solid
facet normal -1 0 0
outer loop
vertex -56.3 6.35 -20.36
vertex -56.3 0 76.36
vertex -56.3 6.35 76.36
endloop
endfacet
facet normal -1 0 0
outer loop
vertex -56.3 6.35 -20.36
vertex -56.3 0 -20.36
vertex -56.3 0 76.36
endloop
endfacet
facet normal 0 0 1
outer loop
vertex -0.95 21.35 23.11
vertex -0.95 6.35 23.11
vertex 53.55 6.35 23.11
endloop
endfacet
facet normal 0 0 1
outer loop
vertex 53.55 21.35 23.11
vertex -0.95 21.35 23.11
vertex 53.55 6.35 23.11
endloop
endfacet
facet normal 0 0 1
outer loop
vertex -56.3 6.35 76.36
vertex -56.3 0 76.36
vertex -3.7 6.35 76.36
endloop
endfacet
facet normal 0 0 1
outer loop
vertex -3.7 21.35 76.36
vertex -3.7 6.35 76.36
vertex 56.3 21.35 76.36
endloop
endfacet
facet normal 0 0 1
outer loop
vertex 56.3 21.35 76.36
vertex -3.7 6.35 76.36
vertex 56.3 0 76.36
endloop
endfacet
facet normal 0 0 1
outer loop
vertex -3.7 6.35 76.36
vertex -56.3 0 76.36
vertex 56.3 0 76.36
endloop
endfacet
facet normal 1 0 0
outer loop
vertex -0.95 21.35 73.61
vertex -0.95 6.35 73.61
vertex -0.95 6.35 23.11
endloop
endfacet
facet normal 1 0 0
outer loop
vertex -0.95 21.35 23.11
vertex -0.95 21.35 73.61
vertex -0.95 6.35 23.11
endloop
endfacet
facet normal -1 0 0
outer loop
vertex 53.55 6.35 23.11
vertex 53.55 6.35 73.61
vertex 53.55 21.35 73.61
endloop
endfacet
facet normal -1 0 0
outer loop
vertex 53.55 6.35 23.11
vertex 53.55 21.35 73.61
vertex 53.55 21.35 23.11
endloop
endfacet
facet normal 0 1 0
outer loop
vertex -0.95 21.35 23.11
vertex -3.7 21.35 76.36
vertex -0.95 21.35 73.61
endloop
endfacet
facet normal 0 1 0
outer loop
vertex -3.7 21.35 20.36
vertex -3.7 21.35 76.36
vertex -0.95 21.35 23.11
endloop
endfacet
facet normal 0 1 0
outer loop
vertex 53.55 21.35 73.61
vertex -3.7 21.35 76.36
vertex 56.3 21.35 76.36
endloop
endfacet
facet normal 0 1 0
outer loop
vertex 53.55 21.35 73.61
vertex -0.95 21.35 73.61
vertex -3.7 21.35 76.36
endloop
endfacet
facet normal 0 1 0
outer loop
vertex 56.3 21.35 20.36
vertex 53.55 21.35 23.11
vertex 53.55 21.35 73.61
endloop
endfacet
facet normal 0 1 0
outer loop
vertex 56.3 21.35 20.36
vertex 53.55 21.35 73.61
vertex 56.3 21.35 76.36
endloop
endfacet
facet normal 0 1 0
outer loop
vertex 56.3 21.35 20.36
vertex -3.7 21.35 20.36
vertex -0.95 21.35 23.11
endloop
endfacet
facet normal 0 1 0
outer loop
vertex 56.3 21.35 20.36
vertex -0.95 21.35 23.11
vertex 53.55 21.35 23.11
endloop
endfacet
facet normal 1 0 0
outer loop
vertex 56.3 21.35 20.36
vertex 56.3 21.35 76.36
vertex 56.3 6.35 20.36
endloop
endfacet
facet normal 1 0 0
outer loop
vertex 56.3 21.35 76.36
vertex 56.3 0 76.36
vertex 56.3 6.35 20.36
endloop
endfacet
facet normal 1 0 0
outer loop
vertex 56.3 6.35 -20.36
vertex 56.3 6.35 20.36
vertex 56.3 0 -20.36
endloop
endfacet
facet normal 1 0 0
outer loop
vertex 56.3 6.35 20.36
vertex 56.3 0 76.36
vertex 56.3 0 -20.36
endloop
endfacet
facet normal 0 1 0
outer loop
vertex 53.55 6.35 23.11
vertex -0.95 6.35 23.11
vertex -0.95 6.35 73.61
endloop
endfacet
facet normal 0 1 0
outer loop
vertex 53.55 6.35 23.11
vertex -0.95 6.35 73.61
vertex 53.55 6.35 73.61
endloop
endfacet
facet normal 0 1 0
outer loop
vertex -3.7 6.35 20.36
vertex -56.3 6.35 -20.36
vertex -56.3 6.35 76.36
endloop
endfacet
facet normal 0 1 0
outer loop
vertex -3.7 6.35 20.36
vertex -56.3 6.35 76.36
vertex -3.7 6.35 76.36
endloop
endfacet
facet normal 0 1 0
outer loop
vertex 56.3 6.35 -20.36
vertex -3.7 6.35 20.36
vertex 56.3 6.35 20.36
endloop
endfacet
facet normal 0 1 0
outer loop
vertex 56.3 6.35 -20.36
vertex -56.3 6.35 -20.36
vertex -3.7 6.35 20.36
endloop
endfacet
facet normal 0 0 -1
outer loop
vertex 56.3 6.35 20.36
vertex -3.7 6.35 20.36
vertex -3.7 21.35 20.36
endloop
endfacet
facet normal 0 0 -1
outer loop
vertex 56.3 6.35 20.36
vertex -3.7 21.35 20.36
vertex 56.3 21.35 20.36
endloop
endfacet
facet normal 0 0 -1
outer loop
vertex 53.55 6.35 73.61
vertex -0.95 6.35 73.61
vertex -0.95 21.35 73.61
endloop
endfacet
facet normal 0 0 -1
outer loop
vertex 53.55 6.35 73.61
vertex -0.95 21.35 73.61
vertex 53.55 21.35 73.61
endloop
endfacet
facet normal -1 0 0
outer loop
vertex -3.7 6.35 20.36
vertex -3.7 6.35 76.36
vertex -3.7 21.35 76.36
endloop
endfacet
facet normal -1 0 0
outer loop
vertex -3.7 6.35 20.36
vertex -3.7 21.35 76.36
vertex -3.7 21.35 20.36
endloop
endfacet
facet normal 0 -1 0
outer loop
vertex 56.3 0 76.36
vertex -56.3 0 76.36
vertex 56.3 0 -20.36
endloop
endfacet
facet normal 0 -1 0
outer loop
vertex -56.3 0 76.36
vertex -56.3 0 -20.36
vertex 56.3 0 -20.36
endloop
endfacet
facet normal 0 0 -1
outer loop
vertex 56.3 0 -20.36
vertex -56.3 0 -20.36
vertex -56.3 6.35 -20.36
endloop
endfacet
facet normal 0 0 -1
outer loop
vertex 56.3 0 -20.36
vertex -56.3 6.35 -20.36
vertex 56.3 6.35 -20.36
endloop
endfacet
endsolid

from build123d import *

# Parameters (mm, degrees)
SKETCH1_W           = 112.6
SKETCH1_H           = 40.72
BOSS_EXTRUDE1_DEPTH = 6.35
SKETCH2_W           = 112.6
SKETCH2_H           = 6.35
BOSS_EXTRUDE2_DEPTH = 56
SKETCH3_W           = 60
SKETCH3_H           = 56
SKETCH3_W_2         = 54.5
SKETCH3_H_2         = 50.5
BOSS_EXTRUDE3_DEPTH = 15


with BuildPart() as part:
    # Sketch1 → Boss-Extrude1 (new body)
    with BuildSketch(Plane(origin=(0, 0, 0), x_dir=(1, 0, 0), z_dir=(0, 1, 0))):
        Rectangle(SKETCH1_W, SKETCH1_H)
    extrude(amount=BOSS_EXTRUDE1_DEPTH)

    # Sketch2 → Boss-Extrude2 (add)
    with BuildSketch(Plane.XY.offset(20.36)):
        with Locations((0, 3.175)):
            Rectangle(SKETCH2_W, SKETCH2_H)
    extrude(amount=BOSS_EXTRUDE2_DEPTH)

    # Sketch3 → Boss-Extrude3 (add)
    with BuildSketch(Plane(origin=(0, 6.35, 0), x_dir=(1, 0, 0), z_dir=(0, 1, 0))):
        with Locations((26.3, -48.36)):
            Rectangle(SKETCH3_W, SKETCH3_H)
        with Locations((26.3, -48.36)):
            Rectangle(SKETCH3_W_2, SKETCH3_H_2, mode=Mode.SUBTRACT)
    extrude(amount=BOSS_EXTRUDE3_DEPTH)


solid = part.part
